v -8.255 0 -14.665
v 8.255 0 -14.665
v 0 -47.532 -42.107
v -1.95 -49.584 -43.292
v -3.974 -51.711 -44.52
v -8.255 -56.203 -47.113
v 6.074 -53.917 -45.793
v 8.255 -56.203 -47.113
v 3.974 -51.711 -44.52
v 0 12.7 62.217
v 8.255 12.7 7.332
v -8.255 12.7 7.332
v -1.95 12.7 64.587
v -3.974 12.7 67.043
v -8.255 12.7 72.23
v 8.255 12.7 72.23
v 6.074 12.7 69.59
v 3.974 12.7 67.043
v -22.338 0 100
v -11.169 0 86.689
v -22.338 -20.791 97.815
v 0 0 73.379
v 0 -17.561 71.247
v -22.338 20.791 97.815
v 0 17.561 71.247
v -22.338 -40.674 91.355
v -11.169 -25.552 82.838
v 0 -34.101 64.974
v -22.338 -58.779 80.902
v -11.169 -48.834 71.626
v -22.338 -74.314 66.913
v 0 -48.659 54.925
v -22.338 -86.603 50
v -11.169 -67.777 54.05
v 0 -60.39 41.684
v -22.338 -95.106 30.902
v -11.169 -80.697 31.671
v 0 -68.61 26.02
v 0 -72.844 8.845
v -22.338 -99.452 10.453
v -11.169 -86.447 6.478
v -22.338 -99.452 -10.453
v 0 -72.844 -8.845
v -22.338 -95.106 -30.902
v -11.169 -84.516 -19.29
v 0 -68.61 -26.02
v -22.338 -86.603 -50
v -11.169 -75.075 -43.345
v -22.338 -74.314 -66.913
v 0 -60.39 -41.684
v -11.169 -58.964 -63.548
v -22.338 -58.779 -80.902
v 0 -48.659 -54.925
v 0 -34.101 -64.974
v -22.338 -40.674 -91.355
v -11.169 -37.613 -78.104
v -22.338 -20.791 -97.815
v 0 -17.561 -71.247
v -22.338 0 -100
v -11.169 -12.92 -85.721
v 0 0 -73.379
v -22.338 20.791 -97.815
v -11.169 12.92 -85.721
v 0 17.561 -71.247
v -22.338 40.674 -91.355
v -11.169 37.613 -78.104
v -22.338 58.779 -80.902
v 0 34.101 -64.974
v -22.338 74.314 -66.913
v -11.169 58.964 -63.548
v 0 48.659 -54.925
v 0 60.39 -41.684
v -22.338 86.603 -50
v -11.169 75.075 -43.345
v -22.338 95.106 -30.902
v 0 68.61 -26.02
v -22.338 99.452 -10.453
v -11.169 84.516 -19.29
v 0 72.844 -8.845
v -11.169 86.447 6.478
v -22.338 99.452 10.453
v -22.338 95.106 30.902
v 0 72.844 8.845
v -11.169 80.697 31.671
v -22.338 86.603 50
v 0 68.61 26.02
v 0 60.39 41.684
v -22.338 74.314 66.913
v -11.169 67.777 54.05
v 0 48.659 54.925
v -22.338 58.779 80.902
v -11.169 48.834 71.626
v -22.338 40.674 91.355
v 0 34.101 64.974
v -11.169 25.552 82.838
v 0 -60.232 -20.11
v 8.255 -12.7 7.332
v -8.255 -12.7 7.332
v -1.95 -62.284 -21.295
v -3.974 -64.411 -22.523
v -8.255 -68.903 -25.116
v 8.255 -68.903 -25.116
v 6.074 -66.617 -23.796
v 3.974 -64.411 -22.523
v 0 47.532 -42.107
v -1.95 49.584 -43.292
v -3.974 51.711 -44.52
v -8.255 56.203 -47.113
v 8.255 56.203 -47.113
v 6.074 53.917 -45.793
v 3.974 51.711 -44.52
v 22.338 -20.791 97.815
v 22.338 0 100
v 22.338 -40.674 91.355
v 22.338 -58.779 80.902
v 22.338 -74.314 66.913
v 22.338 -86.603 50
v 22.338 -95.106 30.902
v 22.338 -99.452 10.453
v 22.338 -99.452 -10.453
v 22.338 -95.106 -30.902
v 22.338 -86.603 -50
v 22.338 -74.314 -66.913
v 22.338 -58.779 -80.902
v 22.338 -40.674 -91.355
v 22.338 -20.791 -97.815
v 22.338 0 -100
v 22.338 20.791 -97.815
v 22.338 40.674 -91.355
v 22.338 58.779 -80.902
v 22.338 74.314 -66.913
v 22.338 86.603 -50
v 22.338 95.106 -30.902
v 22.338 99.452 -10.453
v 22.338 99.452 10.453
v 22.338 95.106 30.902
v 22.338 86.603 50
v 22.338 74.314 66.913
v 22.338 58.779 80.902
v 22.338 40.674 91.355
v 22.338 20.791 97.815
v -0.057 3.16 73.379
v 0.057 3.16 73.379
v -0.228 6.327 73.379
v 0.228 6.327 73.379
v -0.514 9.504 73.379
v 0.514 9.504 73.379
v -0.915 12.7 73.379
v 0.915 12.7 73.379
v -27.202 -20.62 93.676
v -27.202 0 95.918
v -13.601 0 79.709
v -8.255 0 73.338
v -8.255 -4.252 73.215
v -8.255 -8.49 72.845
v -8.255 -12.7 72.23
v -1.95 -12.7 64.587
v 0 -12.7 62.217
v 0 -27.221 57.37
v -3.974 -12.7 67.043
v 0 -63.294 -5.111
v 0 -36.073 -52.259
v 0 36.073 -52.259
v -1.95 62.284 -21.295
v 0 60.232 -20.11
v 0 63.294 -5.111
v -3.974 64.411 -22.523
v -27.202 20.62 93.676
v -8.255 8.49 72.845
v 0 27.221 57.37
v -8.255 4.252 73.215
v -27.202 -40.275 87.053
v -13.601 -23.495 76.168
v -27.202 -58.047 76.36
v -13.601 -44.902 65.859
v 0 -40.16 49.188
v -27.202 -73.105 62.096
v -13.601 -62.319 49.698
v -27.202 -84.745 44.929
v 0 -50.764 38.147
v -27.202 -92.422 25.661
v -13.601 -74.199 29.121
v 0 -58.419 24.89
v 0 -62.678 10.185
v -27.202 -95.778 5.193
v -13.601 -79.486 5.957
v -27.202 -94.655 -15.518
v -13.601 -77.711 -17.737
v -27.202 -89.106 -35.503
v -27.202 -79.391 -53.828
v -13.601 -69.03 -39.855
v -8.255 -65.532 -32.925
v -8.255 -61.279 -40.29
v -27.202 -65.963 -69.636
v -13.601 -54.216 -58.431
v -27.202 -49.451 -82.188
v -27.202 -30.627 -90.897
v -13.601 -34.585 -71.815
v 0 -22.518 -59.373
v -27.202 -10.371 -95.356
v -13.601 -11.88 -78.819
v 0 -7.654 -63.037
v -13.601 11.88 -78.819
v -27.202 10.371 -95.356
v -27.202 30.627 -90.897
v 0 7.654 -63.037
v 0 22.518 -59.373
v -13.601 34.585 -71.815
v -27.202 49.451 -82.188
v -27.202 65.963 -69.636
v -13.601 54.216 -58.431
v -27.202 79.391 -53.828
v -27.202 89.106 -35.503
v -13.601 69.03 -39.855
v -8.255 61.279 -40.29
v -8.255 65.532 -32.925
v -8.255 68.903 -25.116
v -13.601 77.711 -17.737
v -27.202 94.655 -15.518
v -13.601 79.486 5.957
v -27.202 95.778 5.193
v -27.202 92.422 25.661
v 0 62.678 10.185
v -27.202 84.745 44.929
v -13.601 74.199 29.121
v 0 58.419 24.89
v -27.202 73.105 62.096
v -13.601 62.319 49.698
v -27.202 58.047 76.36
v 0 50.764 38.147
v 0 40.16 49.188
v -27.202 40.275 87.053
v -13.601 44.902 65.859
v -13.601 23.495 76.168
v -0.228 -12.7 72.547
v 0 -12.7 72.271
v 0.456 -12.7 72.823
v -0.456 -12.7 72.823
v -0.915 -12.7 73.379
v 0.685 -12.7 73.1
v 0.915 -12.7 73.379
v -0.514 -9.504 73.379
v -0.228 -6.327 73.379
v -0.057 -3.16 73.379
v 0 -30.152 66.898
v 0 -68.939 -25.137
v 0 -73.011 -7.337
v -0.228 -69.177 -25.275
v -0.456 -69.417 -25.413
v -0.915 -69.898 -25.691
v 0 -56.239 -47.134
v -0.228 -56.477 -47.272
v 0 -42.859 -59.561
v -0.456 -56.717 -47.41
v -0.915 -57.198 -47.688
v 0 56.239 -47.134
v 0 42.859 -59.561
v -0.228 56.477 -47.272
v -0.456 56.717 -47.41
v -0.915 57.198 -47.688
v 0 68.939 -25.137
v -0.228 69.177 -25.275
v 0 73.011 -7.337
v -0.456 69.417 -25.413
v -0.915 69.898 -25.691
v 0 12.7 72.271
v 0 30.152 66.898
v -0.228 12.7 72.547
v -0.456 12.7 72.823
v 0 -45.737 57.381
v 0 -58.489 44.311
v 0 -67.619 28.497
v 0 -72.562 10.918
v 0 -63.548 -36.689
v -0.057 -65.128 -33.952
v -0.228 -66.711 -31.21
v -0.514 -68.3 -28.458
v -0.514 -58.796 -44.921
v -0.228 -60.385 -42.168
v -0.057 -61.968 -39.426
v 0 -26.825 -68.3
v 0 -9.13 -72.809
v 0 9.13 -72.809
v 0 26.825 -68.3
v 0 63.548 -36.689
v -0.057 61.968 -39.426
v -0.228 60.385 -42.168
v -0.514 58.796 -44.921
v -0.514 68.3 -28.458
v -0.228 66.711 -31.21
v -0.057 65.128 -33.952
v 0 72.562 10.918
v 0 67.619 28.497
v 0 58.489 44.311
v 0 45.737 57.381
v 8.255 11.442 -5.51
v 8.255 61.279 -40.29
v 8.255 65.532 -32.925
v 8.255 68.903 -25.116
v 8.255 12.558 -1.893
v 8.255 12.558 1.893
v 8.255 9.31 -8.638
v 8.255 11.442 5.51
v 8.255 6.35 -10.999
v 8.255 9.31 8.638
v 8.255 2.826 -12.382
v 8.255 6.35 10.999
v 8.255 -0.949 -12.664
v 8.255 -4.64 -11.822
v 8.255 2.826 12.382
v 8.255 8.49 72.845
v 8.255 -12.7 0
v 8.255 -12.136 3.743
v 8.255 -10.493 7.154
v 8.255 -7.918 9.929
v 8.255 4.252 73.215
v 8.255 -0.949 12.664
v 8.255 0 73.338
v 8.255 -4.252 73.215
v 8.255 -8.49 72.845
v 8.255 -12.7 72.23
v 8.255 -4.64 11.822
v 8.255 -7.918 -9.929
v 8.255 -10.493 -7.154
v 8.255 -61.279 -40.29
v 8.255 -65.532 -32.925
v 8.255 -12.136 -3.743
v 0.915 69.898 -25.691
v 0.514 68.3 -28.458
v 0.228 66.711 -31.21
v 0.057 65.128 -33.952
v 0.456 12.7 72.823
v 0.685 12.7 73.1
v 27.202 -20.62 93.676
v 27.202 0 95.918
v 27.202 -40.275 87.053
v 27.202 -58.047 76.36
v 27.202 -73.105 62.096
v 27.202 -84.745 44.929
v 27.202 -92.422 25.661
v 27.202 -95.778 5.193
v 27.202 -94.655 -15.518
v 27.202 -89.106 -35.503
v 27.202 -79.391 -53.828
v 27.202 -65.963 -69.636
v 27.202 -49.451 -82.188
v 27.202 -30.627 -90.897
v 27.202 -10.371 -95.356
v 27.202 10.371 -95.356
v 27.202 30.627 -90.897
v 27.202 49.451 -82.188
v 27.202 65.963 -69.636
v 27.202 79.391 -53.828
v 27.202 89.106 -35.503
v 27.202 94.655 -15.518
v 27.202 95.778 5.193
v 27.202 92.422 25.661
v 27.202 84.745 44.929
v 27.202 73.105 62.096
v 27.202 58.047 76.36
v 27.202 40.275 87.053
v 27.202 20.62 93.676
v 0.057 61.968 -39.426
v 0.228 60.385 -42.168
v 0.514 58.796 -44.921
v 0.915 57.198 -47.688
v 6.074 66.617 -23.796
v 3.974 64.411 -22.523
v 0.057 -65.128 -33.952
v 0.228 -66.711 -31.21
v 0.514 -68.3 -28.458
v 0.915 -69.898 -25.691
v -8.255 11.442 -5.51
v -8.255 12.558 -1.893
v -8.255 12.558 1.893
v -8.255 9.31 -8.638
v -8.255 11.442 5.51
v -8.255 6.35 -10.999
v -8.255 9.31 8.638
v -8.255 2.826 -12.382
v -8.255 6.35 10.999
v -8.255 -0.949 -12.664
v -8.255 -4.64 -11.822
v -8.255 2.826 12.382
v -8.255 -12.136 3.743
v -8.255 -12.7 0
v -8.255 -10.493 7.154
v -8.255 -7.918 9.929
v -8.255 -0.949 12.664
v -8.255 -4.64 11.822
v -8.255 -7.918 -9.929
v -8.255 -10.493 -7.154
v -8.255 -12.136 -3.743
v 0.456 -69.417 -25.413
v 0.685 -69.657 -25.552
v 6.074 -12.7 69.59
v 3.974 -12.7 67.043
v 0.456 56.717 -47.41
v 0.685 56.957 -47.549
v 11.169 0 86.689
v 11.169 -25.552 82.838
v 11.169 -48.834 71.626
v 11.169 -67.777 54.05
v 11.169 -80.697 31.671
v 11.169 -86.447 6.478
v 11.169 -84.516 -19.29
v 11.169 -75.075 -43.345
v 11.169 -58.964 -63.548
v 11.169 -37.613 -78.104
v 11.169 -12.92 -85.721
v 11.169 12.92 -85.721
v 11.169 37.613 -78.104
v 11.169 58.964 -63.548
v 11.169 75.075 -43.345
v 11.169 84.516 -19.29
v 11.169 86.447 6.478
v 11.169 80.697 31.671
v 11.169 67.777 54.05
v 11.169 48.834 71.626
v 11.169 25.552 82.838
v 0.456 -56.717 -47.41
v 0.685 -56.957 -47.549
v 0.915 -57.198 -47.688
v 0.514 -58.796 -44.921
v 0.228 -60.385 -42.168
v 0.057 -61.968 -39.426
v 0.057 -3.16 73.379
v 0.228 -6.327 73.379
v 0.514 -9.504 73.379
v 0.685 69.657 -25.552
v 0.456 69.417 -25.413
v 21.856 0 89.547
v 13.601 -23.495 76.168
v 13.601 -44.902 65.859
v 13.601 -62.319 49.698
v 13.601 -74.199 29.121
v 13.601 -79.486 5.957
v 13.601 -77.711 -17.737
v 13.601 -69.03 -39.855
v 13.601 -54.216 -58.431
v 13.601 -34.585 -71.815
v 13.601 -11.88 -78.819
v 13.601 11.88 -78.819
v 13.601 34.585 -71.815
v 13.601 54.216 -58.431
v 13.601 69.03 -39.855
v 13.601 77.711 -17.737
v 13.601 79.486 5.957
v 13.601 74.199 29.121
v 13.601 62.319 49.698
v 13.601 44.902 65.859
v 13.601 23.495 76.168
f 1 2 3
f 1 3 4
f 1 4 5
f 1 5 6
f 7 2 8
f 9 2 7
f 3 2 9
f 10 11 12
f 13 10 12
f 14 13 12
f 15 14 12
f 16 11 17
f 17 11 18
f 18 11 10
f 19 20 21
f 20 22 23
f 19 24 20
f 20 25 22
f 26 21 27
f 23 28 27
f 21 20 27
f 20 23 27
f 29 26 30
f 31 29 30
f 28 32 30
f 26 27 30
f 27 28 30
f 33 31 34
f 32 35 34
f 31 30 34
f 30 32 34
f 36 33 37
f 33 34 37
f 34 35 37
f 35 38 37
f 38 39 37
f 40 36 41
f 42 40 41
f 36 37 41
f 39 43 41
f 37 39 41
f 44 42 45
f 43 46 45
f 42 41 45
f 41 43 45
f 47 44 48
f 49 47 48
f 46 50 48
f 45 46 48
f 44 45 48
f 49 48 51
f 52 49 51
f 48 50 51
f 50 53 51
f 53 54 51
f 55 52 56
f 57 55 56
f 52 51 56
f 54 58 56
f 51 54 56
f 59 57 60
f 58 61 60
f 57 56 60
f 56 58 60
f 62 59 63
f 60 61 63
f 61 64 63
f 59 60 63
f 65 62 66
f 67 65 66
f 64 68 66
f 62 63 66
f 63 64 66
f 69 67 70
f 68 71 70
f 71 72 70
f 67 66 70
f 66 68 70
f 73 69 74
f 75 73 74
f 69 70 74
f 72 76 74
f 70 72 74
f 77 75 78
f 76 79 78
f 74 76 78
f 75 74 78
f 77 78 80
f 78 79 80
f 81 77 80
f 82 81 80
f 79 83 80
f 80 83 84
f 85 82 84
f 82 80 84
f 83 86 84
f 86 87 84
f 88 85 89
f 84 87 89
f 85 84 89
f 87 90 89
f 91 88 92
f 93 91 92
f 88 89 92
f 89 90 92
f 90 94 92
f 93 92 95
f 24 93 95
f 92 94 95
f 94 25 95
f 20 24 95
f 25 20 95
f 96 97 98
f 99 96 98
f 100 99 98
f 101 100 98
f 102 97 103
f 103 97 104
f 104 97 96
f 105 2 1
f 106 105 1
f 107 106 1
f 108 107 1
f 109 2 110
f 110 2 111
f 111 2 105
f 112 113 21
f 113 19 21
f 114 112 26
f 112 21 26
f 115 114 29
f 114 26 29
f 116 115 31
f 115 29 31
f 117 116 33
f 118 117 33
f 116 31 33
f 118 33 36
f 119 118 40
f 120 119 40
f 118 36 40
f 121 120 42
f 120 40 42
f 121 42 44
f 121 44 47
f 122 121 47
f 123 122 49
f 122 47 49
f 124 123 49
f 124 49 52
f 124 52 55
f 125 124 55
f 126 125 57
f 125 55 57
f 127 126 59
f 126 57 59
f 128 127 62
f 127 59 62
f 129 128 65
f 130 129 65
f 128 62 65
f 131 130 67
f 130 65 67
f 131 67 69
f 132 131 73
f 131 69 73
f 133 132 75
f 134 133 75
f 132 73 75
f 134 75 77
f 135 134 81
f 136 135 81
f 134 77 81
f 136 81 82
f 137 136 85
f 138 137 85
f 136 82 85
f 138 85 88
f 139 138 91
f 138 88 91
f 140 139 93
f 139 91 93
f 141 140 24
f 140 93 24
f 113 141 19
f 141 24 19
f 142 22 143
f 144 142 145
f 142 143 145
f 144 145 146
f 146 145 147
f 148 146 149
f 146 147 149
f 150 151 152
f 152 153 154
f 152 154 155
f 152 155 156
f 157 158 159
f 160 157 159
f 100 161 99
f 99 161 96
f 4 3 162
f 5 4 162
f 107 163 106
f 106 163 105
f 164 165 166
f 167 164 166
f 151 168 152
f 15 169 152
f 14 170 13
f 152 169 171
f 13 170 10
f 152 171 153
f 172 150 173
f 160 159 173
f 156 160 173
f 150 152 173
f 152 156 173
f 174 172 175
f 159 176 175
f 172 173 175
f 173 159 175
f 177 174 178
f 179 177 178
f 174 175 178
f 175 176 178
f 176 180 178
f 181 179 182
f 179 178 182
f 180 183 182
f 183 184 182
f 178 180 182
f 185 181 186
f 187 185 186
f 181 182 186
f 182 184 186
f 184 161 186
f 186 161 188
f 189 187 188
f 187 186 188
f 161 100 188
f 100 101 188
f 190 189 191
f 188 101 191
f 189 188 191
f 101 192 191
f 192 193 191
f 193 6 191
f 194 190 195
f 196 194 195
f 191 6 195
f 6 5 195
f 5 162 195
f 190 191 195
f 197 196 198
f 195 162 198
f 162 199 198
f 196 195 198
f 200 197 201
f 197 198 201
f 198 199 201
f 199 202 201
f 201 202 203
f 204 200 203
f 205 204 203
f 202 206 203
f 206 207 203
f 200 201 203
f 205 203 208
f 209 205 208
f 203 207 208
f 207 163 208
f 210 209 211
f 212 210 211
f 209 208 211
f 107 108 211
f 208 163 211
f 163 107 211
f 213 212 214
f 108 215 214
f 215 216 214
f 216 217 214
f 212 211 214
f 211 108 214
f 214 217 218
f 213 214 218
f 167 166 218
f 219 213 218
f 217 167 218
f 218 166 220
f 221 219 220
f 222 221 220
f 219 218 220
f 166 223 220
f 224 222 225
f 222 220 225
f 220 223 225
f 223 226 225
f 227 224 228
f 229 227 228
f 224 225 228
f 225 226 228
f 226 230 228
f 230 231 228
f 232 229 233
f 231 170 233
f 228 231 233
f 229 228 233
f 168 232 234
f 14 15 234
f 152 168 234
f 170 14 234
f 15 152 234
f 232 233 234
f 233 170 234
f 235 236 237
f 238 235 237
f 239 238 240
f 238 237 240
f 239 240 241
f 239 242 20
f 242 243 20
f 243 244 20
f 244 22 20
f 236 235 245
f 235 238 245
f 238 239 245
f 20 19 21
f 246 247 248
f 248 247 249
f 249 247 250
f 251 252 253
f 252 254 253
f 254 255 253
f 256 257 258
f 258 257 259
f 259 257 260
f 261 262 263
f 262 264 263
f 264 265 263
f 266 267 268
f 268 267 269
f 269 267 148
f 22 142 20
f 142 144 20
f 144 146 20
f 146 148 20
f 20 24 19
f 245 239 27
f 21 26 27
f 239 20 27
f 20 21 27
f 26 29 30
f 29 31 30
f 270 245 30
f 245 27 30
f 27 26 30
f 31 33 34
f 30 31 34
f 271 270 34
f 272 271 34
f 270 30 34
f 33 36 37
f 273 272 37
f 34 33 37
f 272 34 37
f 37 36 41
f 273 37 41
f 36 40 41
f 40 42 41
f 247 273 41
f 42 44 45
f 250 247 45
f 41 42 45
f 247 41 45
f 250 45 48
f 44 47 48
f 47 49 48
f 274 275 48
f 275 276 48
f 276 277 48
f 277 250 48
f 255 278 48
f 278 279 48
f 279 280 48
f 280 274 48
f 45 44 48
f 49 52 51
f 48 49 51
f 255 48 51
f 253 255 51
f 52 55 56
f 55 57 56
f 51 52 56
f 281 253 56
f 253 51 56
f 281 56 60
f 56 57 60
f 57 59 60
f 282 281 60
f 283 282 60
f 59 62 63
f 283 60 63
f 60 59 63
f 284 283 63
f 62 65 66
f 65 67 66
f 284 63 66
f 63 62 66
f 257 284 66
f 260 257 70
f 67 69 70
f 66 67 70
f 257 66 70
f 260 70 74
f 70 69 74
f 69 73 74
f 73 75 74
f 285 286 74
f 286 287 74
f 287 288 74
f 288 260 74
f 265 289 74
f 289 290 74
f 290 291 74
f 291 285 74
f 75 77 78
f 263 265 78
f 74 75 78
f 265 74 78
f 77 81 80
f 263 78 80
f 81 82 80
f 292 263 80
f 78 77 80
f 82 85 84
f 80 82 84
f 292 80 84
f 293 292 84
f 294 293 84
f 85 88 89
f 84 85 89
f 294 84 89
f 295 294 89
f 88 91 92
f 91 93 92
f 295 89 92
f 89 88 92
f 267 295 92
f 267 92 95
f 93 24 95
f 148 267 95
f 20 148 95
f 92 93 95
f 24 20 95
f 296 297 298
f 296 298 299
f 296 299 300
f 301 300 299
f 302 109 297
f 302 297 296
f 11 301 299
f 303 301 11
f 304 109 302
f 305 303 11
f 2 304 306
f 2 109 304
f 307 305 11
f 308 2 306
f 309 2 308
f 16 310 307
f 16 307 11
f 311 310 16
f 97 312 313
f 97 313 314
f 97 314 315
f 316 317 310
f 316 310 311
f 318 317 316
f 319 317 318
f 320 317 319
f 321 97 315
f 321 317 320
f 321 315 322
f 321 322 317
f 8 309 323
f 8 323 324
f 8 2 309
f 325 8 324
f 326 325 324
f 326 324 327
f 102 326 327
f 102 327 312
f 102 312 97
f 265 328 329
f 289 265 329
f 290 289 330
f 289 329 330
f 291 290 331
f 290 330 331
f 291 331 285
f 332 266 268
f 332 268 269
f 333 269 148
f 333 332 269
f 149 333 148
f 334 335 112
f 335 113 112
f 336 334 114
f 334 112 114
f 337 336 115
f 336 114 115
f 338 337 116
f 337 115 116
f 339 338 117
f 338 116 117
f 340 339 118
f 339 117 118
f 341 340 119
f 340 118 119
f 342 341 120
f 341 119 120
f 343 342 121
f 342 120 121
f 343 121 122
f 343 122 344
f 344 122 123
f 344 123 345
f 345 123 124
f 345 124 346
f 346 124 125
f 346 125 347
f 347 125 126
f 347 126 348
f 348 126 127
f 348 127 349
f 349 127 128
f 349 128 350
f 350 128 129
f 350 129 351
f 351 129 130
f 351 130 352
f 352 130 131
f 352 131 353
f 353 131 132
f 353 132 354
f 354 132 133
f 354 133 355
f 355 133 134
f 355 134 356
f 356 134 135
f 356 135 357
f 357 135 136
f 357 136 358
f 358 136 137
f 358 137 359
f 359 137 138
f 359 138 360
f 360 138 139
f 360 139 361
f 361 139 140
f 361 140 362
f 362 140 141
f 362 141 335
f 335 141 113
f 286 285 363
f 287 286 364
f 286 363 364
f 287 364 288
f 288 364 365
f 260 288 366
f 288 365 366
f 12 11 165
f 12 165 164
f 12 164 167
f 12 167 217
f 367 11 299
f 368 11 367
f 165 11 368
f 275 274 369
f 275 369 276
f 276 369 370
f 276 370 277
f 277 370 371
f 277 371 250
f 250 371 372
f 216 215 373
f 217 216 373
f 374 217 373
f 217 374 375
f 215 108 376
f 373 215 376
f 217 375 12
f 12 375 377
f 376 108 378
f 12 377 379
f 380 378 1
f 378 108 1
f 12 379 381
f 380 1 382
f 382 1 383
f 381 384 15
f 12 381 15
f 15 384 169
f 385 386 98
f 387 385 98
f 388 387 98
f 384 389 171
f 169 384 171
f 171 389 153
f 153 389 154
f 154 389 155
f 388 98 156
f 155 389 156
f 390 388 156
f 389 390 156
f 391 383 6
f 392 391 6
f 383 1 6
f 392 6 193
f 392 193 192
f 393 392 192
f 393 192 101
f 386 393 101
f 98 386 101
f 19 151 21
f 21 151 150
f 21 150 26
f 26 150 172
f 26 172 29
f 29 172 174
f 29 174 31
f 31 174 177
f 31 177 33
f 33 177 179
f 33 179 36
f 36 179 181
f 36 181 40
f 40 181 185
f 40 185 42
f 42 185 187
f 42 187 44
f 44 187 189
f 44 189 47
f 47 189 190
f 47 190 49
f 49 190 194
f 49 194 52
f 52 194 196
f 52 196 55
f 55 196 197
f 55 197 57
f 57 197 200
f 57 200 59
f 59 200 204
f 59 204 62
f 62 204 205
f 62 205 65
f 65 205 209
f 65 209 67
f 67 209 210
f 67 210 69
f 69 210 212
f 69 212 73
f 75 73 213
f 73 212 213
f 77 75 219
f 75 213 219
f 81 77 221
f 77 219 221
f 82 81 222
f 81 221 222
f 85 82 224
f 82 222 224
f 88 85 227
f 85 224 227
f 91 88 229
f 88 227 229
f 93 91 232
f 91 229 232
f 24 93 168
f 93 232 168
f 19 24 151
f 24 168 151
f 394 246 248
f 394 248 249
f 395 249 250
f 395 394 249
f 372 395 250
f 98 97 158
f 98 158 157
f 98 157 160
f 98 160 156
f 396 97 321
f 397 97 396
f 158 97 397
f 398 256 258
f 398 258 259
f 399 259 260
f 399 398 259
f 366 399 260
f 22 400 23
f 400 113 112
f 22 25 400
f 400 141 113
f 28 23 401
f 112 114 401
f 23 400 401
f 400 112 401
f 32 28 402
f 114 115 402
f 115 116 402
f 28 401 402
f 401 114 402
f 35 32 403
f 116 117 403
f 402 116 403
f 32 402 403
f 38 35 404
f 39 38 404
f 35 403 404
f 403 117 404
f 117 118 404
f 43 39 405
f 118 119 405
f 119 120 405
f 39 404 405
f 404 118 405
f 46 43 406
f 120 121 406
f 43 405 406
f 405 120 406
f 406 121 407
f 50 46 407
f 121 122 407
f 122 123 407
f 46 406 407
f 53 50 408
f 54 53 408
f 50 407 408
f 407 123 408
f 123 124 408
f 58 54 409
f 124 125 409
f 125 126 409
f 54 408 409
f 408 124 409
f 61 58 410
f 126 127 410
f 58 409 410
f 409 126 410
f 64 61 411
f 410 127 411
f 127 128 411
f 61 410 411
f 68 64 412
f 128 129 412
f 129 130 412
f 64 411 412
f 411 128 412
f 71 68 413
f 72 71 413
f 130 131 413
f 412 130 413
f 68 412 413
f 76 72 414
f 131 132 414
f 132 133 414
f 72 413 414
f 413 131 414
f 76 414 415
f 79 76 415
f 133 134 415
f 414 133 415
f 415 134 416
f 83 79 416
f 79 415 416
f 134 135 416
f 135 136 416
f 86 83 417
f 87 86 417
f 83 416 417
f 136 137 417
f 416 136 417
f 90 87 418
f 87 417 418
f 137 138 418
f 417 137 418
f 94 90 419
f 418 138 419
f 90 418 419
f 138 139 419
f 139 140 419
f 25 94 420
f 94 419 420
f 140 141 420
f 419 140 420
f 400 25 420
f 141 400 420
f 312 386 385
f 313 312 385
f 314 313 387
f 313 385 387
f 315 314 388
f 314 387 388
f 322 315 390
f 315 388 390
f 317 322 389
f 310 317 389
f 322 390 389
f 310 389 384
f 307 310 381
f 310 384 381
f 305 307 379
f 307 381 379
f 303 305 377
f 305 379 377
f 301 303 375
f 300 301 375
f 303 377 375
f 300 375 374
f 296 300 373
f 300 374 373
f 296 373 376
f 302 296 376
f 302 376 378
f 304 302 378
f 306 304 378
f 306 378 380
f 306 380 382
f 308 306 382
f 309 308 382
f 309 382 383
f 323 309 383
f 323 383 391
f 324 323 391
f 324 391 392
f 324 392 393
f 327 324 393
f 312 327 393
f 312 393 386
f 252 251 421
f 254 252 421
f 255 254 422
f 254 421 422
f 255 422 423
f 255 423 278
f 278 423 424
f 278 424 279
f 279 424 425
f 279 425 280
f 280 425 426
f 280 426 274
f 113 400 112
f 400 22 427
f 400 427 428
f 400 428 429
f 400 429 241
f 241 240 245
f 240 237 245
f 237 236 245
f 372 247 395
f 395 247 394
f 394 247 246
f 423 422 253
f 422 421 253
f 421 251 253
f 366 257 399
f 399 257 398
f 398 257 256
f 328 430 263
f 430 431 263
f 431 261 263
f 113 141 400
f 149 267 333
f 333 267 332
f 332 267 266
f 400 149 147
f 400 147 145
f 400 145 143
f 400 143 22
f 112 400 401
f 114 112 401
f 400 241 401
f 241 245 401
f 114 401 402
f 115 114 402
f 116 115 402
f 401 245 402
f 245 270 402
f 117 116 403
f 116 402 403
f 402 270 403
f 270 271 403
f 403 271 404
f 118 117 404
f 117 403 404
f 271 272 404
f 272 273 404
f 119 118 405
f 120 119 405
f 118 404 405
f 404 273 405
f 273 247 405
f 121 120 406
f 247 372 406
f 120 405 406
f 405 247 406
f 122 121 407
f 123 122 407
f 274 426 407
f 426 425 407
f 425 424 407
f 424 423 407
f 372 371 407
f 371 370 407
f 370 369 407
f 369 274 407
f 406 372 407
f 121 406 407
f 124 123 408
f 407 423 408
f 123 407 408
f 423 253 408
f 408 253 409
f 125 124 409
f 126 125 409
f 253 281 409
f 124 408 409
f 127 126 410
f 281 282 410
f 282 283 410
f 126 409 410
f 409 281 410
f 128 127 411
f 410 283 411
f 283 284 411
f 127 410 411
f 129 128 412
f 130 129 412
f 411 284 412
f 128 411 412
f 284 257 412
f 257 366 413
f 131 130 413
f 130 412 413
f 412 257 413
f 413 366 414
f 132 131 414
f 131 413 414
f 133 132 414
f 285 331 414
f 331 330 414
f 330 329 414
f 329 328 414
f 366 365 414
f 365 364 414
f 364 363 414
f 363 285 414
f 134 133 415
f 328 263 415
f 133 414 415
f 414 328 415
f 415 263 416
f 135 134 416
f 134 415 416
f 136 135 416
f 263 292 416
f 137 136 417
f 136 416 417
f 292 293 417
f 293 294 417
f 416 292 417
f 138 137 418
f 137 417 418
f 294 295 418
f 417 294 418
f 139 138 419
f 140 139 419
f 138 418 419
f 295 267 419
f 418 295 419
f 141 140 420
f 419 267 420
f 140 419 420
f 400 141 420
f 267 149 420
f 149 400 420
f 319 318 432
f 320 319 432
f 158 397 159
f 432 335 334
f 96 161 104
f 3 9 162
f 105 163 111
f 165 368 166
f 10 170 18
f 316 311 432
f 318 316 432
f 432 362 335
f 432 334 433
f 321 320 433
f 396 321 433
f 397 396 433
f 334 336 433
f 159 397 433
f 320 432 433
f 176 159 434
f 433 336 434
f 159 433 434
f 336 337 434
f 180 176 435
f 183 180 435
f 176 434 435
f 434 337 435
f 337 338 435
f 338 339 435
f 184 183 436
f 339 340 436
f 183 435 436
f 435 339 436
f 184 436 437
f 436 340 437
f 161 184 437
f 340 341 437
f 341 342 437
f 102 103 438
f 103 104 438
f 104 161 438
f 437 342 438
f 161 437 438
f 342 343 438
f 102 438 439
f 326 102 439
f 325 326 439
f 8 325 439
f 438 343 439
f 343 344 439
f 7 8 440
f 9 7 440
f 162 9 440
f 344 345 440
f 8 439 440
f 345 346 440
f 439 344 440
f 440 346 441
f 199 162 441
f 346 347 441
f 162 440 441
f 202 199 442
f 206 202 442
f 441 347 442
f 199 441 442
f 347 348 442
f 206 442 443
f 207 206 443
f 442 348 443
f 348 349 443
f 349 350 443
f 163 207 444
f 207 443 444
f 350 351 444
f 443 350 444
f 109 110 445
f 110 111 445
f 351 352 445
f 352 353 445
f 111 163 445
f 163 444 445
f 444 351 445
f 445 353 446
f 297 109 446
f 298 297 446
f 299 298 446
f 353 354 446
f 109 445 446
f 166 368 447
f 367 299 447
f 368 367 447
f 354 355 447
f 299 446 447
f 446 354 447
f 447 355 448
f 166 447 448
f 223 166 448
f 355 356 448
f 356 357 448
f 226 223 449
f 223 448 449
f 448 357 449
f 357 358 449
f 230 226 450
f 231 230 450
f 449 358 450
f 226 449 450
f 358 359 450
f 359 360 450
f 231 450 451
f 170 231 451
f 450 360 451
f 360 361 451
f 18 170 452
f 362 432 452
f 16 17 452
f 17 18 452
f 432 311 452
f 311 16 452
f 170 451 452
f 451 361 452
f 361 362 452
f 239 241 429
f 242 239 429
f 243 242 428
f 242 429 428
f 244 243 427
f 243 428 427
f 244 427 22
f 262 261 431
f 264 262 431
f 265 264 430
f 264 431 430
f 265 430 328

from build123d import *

# Parameters (mm, degrees)
F2_W            = 25.4
F2_H            = 73.3788463006
F3_DEPTH        = 8.255
F3_COPIES_COUNT = 3
F4_R            = 12.7
F5_DEPTH        = 35.4581824645


# Not quite as in the source:
# - a pattern or mirror of a feature is missing from the dataset's text; its kind, count and spacing are read off the source's solid


with BuildPart() as f1:
    # F0 (on Front) → F1 (revolve)
    with BuildSketch(Plane.XZ):
        Polygon((0, 73.3788463006), (-22.3378002507, 100), (-27.2021824645, 95.9182986785), (0, 63.5), (27.2021824645, 95.9182986785), (22.3378002507, 100), align=None)
    revolve(axis=Axis((12.7538797489, 0, 0), (1, 0, 0)))

    # F2 (on Right) → F3 (join, symmetric)
    with BuildSketch(Plane.YZ):
        with Locations((0, 36.6894231503)):
            Rectangle(F2_W, F2_H)
    f3 = extrude(amount=F3_DEPTH, both=True)

    # F3_copies: F3 ×3 about axis
    f3_copies_axis = Axis((0, 0, 0), (1, 0, 0))
    for i in range(1, F3_COPIES_COUNT):
        add(f3.rotate(f3_copies_axis, i * 360 / F3_COPIES_COUNT))

    # F4 (on face) → F5 (cut, through all)
    with BuildSketch(Plane(origin=(-8.255, 0, 0), x_dir=(0, -1, 0), z_dir=(-1, 0, 0))):
        Circle(F4_R)
    extrude(amount=-F5_DEPTH, mode=Mode.SUBTRACT)


with BuildPart() as f7:
    # F6 (on Front) → F7 (revolve)
    with BuildSketch(Plane.XZ):
        Polygon((22.3378002507, 100), (-22.3378002507, 100), (0, 73.3788463006), align=None)
    revolve(axis=Axis((4.5150928199, 0, 0), (1, 0, 0)))


solid = Compound([f1.part, f7.part])
